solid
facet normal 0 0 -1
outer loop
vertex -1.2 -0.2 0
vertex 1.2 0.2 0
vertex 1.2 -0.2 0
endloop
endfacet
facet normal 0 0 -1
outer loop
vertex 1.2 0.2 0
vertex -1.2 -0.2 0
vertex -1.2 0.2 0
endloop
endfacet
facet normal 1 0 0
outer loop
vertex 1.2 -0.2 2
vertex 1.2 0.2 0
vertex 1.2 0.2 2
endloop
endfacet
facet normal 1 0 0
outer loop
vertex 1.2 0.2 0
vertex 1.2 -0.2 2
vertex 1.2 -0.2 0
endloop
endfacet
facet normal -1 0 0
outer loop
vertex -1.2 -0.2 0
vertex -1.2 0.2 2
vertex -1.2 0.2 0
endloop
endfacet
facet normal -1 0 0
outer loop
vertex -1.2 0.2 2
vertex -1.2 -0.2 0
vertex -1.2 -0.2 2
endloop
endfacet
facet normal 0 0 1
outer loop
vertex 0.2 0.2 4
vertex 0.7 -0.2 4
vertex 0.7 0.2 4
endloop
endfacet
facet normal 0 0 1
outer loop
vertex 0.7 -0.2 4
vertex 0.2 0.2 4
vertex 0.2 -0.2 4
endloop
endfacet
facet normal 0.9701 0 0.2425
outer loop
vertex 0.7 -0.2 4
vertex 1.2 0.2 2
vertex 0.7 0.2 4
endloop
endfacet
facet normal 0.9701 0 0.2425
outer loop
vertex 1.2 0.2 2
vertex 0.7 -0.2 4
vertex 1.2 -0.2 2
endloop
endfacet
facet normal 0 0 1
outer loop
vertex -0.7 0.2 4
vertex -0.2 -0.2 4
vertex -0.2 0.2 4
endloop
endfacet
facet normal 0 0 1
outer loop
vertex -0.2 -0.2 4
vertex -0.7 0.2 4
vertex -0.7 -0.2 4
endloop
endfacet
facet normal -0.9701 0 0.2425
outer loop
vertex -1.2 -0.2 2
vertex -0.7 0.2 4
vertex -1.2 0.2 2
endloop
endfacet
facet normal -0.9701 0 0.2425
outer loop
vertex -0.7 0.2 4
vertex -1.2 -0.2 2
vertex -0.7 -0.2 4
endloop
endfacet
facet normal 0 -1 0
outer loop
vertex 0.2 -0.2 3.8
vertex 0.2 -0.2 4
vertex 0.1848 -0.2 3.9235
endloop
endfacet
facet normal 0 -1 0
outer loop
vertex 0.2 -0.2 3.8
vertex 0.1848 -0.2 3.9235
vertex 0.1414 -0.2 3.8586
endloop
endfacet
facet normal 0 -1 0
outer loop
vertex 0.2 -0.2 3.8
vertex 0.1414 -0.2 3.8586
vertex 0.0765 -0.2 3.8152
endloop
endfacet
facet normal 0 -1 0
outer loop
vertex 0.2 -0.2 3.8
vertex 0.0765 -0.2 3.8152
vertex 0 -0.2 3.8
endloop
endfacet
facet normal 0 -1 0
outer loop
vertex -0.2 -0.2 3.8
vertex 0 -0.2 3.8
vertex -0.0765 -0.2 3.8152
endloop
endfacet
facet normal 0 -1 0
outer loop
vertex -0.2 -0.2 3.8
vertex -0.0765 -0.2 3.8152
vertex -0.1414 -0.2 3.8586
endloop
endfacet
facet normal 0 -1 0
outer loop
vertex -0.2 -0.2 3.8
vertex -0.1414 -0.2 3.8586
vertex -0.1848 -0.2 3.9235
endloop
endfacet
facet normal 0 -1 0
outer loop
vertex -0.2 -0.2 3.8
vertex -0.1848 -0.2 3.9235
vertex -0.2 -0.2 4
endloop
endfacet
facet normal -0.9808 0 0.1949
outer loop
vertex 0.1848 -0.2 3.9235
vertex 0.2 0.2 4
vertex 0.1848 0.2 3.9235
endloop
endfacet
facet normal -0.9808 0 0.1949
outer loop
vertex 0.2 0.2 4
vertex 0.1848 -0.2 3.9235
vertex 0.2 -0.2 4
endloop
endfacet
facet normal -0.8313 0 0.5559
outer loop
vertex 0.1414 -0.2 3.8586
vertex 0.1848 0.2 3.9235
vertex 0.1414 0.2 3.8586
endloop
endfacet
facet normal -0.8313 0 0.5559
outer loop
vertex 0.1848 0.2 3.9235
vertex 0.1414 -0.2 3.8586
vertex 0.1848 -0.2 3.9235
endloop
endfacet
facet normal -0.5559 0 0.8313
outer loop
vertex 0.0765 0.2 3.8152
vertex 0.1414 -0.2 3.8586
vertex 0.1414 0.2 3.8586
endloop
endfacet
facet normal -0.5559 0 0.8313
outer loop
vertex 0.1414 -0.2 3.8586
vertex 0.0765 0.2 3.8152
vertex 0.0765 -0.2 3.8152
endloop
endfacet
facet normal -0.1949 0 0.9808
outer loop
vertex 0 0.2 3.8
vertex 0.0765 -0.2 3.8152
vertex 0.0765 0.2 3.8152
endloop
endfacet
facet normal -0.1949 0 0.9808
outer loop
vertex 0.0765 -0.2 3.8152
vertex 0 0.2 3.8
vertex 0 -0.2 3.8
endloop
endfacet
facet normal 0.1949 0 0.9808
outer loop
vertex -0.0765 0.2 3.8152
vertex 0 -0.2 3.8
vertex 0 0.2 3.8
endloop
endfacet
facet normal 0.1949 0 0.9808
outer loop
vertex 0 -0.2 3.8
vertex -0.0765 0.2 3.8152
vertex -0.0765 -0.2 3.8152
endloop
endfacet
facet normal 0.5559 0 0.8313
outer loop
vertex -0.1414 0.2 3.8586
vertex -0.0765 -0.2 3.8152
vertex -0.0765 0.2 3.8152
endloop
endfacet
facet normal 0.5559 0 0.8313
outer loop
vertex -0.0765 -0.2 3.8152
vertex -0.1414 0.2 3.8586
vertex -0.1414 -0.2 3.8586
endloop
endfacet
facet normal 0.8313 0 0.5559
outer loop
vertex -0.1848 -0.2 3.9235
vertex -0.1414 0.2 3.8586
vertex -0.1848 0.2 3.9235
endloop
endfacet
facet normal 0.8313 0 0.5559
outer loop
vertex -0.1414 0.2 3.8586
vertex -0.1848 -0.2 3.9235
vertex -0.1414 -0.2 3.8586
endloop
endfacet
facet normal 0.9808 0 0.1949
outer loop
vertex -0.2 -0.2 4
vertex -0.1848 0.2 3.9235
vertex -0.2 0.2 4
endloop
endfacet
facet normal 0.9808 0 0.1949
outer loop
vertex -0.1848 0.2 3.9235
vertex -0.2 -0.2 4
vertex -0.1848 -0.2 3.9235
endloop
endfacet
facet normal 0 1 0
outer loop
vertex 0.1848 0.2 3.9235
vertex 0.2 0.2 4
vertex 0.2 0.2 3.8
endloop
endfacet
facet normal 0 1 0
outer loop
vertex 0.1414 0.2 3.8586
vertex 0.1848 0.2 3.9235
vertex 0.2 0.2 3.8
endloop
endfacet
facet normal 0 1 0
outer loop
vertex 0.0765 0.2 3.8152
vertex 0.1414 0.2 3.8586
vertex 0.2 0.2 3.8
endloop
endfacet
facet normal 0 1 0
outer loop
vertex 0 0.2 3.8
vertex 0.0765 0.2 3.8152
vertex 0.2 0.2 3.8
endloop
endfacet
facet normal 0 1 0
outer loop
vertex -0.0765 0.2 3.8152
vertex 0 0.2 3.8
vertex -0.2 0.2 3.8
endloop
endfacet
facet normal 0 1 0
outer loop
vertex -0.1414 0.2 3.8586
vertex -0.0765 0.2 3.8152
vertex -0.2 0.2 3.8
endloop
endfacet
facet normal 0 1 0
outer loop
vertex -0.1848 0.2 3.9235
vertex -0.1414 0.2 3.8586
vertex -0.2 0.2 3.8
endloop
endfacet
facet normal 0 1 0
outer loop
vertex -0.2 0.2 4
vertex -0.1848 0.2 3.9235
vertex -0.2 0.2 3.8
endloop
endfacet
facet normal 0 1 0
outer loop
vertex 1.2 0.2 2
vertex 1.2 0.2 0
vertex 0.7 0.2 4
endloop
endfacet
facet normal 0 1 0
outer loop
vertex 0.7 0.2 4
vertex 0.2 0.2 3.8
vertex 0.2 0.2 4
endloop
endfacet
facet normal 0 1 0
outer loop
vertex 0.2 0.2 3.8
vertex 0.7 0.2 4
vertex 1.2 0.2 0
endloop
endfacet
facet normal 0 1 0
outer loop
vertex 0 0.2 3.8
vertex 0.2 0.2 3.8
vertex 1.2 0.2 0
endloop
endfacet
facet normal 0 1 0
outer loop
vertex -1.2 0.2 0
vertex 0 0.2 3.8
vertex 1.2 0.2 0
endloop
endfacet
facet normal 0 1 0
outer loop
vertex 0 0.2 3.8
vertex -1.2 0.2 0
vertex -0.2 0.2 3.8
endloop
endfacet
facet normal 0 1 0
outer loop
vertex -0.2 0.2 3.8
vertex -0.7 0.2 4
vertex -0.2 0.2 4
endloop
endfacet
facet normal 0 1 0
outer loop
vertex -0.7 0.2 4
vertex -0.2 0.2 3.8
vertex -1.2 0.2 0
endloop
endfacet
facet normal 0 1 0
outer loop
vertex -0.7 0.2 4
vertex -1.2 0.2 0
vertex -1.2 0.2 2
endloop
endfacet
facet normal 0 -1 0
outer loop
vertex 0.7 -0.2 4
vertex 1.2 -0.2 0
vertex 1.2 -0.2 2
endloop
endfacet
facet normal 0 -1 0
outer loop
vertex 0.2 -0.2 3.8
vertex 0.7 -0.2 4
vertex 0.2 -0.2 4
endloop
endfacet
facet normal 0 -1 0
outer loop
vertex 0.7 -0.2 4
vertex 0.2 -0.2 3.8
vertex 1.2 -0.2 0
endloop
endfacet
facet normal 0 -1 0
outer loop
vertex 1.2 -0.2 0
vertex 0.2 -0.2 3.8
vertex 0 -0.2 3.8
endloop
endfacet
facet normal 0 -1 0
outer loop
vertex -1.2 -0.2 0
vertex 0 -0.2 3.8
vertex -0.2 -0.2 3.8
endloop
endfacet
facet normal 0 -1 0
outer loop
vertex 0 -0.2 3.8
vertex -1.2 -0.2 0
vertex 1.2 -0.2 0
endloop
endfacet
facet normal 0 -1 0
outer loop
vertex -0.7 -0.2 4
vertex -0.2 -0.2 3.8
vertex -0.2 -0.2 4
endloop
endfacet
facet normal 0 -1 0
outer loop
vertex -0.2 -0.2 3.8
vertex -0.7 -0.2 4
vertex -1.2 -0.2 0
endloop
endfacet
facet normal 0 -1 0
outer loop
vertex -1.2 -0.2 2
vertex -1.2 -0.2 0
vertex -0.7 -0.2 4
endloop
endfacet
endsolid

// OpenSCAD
// file: ../p/2-4edge.scad
use <../lib.scad>
function ldraw_lib__2_4edge() = [
// 0 Circle 0.5
// 0 Name: 2-4edge.dat
// 0 Author: James Jessiman
// 0 !LDRAW_ORG Primitive UPDATE 2017-01
// 0 !LICENSE Licensed under CC BY 2.0 and CC BY 4.0 : see CAreadme.txt
// 
// 0 BFC CERTIFY CCW
  [0,"BFC","CERTIFY"],
  [0,"BFC","CCW"],
// 
// 0 !HISTORY 2007-06-24 [PTadmin] Header formatted for Contributor Agreement
// 0 !HISTORY 2008-07-01 [PTadmin] Official Update 2008-01
// 0 !HISTORY 2017-01-15 [Steffen] BFCed
// 0 !HISTORY 2017-12-30 [PTadmin] Official Update 2017-01
// 
// 
// 2 24 1 0 0 0.9239 0 0.3827
  [2,24,1,0,0,0.9239,0,0.3827],
// 2 24 0.9239 0 0.3827 0.7071 0 0.7071
  [2,24,0.9239,0,0.3827,0.7071,0,0.7071],
// 2 24 0.7071 0 0.7071 0.3827 0 0.9239
  [2,24,0.7071,0,0.7071,0.3827,0,0.9239],
// 2 24 0.3827 0 0.9239 0 0 1
  [2,24,0.3827,0,0.9239,0,0,1],
// 2 24 0 0 1 -0.3827 0 0.9239
  [2,24,0,0,1,-0.3827,0,0.9239],
// 2 24 -0.3827 0 0.9239 -0.7071 0 0.7071
  [2,24,-0.3827,0,0.9239,-0.7071,0,0.7071],
// 2 24 -0.7071 0 0.7071 -0.9239 0 0.3827
  [2,24,-0.7071,0,0.7071,-0.9239,0,0.3827],
// 2 24 -0.9239 0 0.3827 -1 0 0
  [2,24,-0.9239,0,0.3827,-1,0,0],
];
makepoly(ldraw_lib__2_4edge(), line=0.2);
// file: ../p/2-4cyli.scad
use <../lib.scad>
function ldraw_lib__2_4cyli() = [
// 0 Cylinder 0.5
// 0 Name: 2-4cyli.dat
// 0 Author: James Jessiman
// 0 !LDRAW_ORG Primitive UPDATE 2005-01
// 0 !LICENSE Licensed under CC BY 2.0 and CC BY 4.0 : see CAreadme.txt
// 
// 0 BFC CERTIFY CCW
  [0,"BFC","CERTIFY"],
  [0,"BFC","CCW"],
// 
// 0 !HISTORY 2002-03-23 [sbliss] Added BFC statement; compacted code
// 0 !HISTORY 2002-04-25 [PTadmin] Official Update 2002-02
// 0 !HISTORY 2004-12-11 [nielsk] Recreated using Primitive Generator, Edge lines fixed, BFC changed to CCW
// 0 !HISTORY 2005-12-28 [PTadmin] Official Update 2005-01
// 0 !HISTORY 2007-06-24 [PTadmin] Header formatted for Contributor Agreement
// 0 !HISTORY 2008-07-01 [PTadmin] Official Update 2008-01
// 
// 
// 4 16 .9239 1 .3827 .9239 0 .3827 1 0 0 1 1 0
  [4,16,.9239,1,.3827,.9239,0,.3827,1,0,0,1,1,0],
// 4 16 .7071 1 .7071 .7071 0 .7071 .9239 0 .3827 .9239 1 .3827
  [4,16,.7071,1,.7071,.7071,0,.7071,.9239,0,.3827,.9239,1,.3827],
// 4 16 .3827 1 .9239 .3827 0 .9239 .7071 0 .7071 .7071 1 .7071
  [4,16,.3827,1,.9239,.3827,0,.9239,.7071,0,.7071,.7071,1,.7071],
// 4 16 0 1 1 0 0 1 .3827 0 .9239 .3827 1 .9239
  [4,16,0,1,1,0,0,1,.3827,0,.9239,.3827,1,.9239],
// 4 16 -.3827 1 .9239 -.3827 0 .9239 0 0 1 0 1 1
  [4,16,-.3827,1,.9239,-.3827,0,.9239,0,0,1,0,1,1],
// 4 16 -.7071 1 .7071 -.7071 0 .7071 -.3827 0 .9239 -.3827 1 .9239
  [4,16,-.7071,1,.7071,-.7071,0,.7071,-.3827,0,.9239,-.3827,1,.9239],
// 4 16 -.9239 1 .3827 -.9239 0 .3827 -.7071 0 .7071 -.7071 1 .7071
  [4,16,-.9239,1,.3827,-.9239,0,.3827,-.7071,0,.7071,-.7071,1,.7071],
// 4 16 -1 1 0 -1 0 0 -.9239 0 .3827 -.9239 1 .3827
  [4,16,-1,1,0,-1,0,0,-.9239,0,.3827,-.9239,1,.3827],
// 5 24 1 1 0 1 0 0 1 1 -.4142 .9239 1 .3827
  [5,24,1,1,0,1,0,0,1,1,-.4142,.9239,1,.3827],
// 5 24 .9239 1 .3827 .9239 0 .3827 1 1 0 .7071 1 .7071
  [5,24,.9239,1,.3827,.9239,0,.3827,1,1,0,.7071,1,.7071],
// 5 24 .7071 1 .7071 .7071 0 .7071 .9239 1 .3827 .3827 1 .9239
  [5,24,.7071,1,.7071,.7071,0,.7071,.9239,1,.3827,.3827,1,.9239],
// 5 24 .3827 1 .9239 .3827 0 .9239 .7071 1 .7071 0 1 1
  [5,24,.3827,1,.9239,.3827,0,.9239,.7071,1,.7071,0,1,1],
// 5 24 0 1 1 0 0 1 .3827 1 .9239 -.3827 1 .9239
  [5,24,0,1,1,0,0,1,.3827,1,.9239,-.3827,1,.9239],
// 5 24 -.3827 1 .9239 -.3827 0 .9239 0 1 1 -.7071 1 .7071
  [5,24,-.3827,1,.9239,-.3827,0,.9239,0,1,1,-.7071,1,.7071],
// 5 24 -.7071 1 .7071 -.7071 0 .7071 -.3827 1 .9239 -.9239 1 .3827
  [5,24,-.7071,1,.7071,-.7071,0,.7071,-.3827,1,.9239,-.9239,1,.3827],
// 5 24 -.9239 1 .3827 -.9239 0 .3827 -.7071 1 .7071 -1 1 0
  [5,24,-.9239,1,.3827,-.9239,0,.3827,-.7071,1,.7071,-1,1,0],
// 5 24 -1 1 0 -1 0 0 -.9239 1 .3827 -1 1 -.4142
  [5,24,-1,1,0,-1,0,0,-.9239,1,.3827,-1,1,-.4142],
// 0
];
makepoly(ldraw_lib__2_4cyli(), line=0.2);
// file: ../p/box3u4a.scad
use <../lib.scad>
function ldraw_lib__box3u4a() = [
// 0 Box with 3 Faces without 4 Adjacent Edges
// 0 Name: box3u4a.dat
// 0 Author: Niels Karsdorp [nielsk]
// 0 !LDRAW_ORG Primitive UPDATE 2009-01
// 0 !LICENSE Licensed under CC BY 2.0 and CC BY 4.0 : see CAreadme.txt
// 
// 0 BFC CERTIFY CCW
  [0,"BFC","CERTIFY"],
  [0,"BFC","CCW"],
// 
// 0 !HISTORY 2009-05-02 [PTadmin] Official Update 2009-01
// 
// 
// 2 24 1 1 1 -1 1 1
  [2,24,1,1,1,-1,1,1],
// 2 24 -1 1 -1 1 1 -1
  [2,24,-1,1,-1,1,1,-1],
// 2 24 1 1 1 1 1 -1
  [2,24,1,1,1,1,1,-1],
// 2 24 -1 1 1 -1 1 -1
  [2,24,-1,1,1,-1,1,-1],
// 2 24 1 1 1 1 0 1
  [2,24,1,1,1,1,0,1],
// 2 24 1 1 -1 1 0 -1
  [2,24,1,1,-1,1,0,-1],
// 2 24 -1 1 1 -1 0 1
  [2,24,-1,1,1,-1,0,1],
// 2 24 -1 1 -1 -1 0 -1
  [2,24,-1,1,-1,-1,0,-1],
// 4 16 -1 1 -1 -1 1 1 1 1 1 1 1 -1
  [4,16,-1,1,-1,-1,1,1,1,1,1,1,1,-1],
// 4 16 -1 1 1 -1 0 1 1 0 1 1 1 1
  [4,16,-1,1,1,-1,0,1,1,0,1,1,1,1],
// 4 16 1 1 -1 1 0 -1 -1 0 -1 -1 1 -1
  [4,16,1,1,-1,1,0,-1,-1,0,-1,-1,1,-1],
// 0
];
makepoly(ldraw_lib__box3u4a(), line=0.2);
// file: ../p/box2-5.scad
use <../lib.scad>
function ldraw_lib__box2_5() = [
// 0 Box with 2 Faces without 5 Edges
// 0 Name: box2-5.dat
// 0 Author: Steffen [Steffen]
// 0 !LDRAW_ORG Primitive UPDATE 2003-03
// 0 !LICENSE Licensed under CC BY 2.0 and CC BY 4.0 : see CAreadme.txt
// 
// 0 BFC CERTIFY CCW
  [0,"BFC","CERTIFY"],
  [0,"BFC","CCW"],
// 
// 0 !HISTORY 2003-12-19 [PTadmin] Official Update 2003-03
// 0 !HISTORY 2007-06-24 [PTadmin] Header formatted for Contributor Agreement
// 0 !HISTORY 2008-07-01 [PTadmin] Official Update 2008-01
// 
// 
// 2 24 1 1 1 -1 1 1
  [2,24,1,1,1,-1,1,1],
// 2 24 1 1 -1 -1 1 -1
  [2,24,1,1,-1,-1,1,-1],
// 2 24 1 -1 1 -1 -1 1
  [2,24,1,-1,1,-1,-1,1],
// 2 24 -1 -1 1 -1 1 1
  [2,24,-1,-1,1,-1,1,1],
// 2 24 1 -1 1 1 1 1
  [2,24,1,-1,1,1,1,1],
// 2 24 -1 1 -1 -1 1 1
  [2,24,-1,1,-1,-1,1,1],
// 2 24 1 1 -1 1 1 1
  [2,24,1,1,-1,1,1,1],
// 4 16 1 1 1 1 1 -1 -1 1 -1 -1 1 1
  [4,16,1,1,1,1,1,-1,-1,1,-1,-1,1,1],
// 4 16 1 1 1 -1 1 1 -1 -1 1 1 -1 1
  [4,16,1,1,1,-1,1,1,-1,-1,1,1,-1,1],
// 0
];
makepoly(ldraw_lib__box2_5(), line=0.2);
// file: ../p/2-4ndis.scad
use <../lib.scad>
function ldraw_lib__2_4ndis() = [
// 0 Disc Negative 0.5
// 0 Name: 2-4ndis.dat
// 0 Author: James Jessiman
// 0 !LDRAW_ORG Primitive UPDATE 2012-01
// 0 !LICENSE Licensed under CC BY 2.0 and CC BY 4.0 : see CAreadme.txt
// 
// 0 BFC CERTIFY CCW
  [0,"BFC","CERTIFY"],
  [0,"BFC","CCW"],
// 
// 0 !HISTORY 2002-03-23 [sbliss] Added BFC statement; compacted code
// 0 !HISTORY 2002-04-25 [PTadmin] Official Update 2002-02
// 0 !HISTORY 2007-06-24 [PTadmin] Header formatted for Contributor Agreement
// 0 !HISTORY 2008-07-01 [PTadmin] Official Update 2008-01
// 0 !HISTORY 2012-02-16 [Philo] Changed to CCW
// 0 !HISTORY 2012-03-30 [PTadmin] Official Update 2012-01
// 
// 
// 3 16 0.9239 0 0.3827 1 0 0 1 0 1
  [3,16,0.9239,0,0.3827,1,0,0,1,0,1],
// 3 16 0.7071 0 0.7071 0.9239 0 0.3827 1 0 1
  [3,16,0.7071,0,0.7071,0.9239,0,0.3827,1,0,1],
// 3 16 0.3827 0 0.9239 0.7071 0 0.7071 1 0 1
  [3,16,0.3827,0,0.9239,0.7071,0,0.7071,1,0,1],
// 3 16 0 0 1 0.3827 0 0.9239 1 0 1
  [3,16,0,0,1,0.3827,0,0.9239,1,0,1],
// 3 16 -0.3827 0 0.9239 0 0 1 -1 0 1
  [3,16,-0.3827,0,0.9239,0,0,1,-1,0,1],
// 3 16 -0.7071 0 0.7071 -0.3827 0 0.9239 -1 0 1
  [3,16,-0.7071,0,0.7071,-0.3827,0,0.9239,-1,0,1],
// 3 16 -0.9239 0 0.3827 -0.7071 0 0.7071 -1 0 1
  [3,16,-0.9239,0,0.3827,-0.7071,0,0.7071,-1,0,1],
// 3 16 -1 0 0 -0.9239 0 0.3827 -1 0 1
  [3,16,-1,0,0,-0.9239,0,0.3827,-1,0,1],
];
makepoly(ldraw_lib__2_4ndis(), line=0.2);
// file: ../p/2-4cylo.scad
use <../lib.scad>
use <2-4cyli.scad>
use <2-4edge.scad>
function ldraw_lib__2_4cylo() = [
// 0 Cylinder Open 0.5
// 0 Name: 2-4cylo.dat
// 0 Author: Max Martin Richter [MMR1988]
// 0 !LDRAW_ORG Primitive UPDATE 2010-03
// 0 !LICENSE Licensed under CC BY 2.0 and CC BY 4.0 : see CAreadme.txt
// 
// 0 BFC CERTIFY CCW
  [0,"BFC","CERTIFY"],
  [0,"BFC","CCW"],
// 
// 0 !HISTORY 2010-12-31 [PTadmin] Official Update 2010-03
// 
// 
// 1 16 0 0 0 1 0 0 0 1 0 0 0 1 2-4edge.dat
  [1,16,0,0,0,1,0,0,0,1,0,0,0,1, ldraw_lib__2_4edge()],
// 1 16 0 1 0 1 0 0 0 1 0 0 0 1 2-4edge.dat
  [1,16,0,1,0,1,0,0,0,1,0,0,0,1, ldraw_lib__2_4edge()],
// 1 16 0 0 0 1 0 0 0 1 0 0 0 1 2-4cyli.dat
  [1,16,0,0,0,1,0,0,0,1,0,0,0,1, ldraw_lib__2_4cyli()],
];
makepoly(ldraw_lib__2_4cylo(), line=0.2);
// main file
use <../lib.scad>
use <../p/2-4cylo.scad>
use <../p/2-4ndis.scad>
use <../p/box2-5.scad>
use <../p/box3u4a.scad>
function ldraw_lib__u9269() = [
// 0 ~Electric Brick  2 x  2 x  0.667 Underside Metal Clamp
// 0 Name: u9269.dat
// 0 Author: Max Martin Richter [MMR1988]
// 0 !LDRAW_ORG Part UPDATE 2013-02
// 0 !LICENSE Licensed under CC BY 2.0 and CC BY 4.0 : see CAreadme.txt
// 
// 0 BFC CERTIFY CCW
  [0,"BFC","CERTIFY"],
  [0,"BFC","CCW"],
// 
// 0 !HISTORY 2013-12-23 [PTadmin] Official Update 2013-02
// 
// 
// 1 16 0 -5 0 0 0 3 0 5 0 -0.5 0 0 box3u4a.dat
  [1,16,0,-5,0,0,0,3,0,5,0,-0.5,0,0, ldraw_lib__box3u4a()],
// 1 16 1.75 -7.5 0 0 -0.625 0.625 0 -2.5 0 -0.5 0 0 box2-5.dat
  [1,16,1.75,-7.5,0,0,-0.625,0.625,0,-2.5,0,-0.5,0,0, ldraw_lib__box2_5()],
// 1 16 -1.75 -7.5 0 0 0.625 -0.625 0 -2.5 0 -0.5 0 0 box2-5.dat
  [1,16,-1.75,-7.5,0,0,0.625,-0.625,0,-2.5,0,-0.5,0,0, ldraw_lib__box2_5()],
// 
// 1 16 0 -10 -0.5 0.5 0 0 0 0 0.5 0 1 0 2-4ndis.dat
  [1,16,0,-10,-0.5,0.5,0,0,0,0,0.5,0,1,0, ldraw_lib__2_4ndis()],
// 0 BFC INVERTNEXT
  [0,"BFC","INVERTNEXT"],
// 1 16 0 -10 -0.5 0.5 0 0 0 0 0.5 0 1 0 2-4cylo.dat
  [1,16,0,-10,-0.5,0.5,0,0,0,0,0.5,0,1,0, ldraw_lib__2_4cylo()],
// 1 16 0 -10 0.5 0.5 0 0 0 0 0.5 0 -1 0 2-4ndis.dat
  [1,16,0,-10,0.5,0.5,0,0,0,0,0.5,0,-1,0, ldraw_lib__2_4ndis()],
// 
// 3 16 3 -5 0.5 3 0 0.5 1.75 -10 0.5
  [3,16,3,-5,0.5,3,0,0.5,1.75,-10,0.5],
// 4 16 3 0 0.5 0.5 -9.5 0.5 0.5 -10 0.5 1.75 -10 0.5
  [4,16,3,0,0.5,0.5,-9.5,0.5,0.5,-10,0.5,1.75,-10,0.5],
// 3 16 0 -9.5 0.5 0.5 -9.5 0.5 3 0 0.5
  [3,16,0,-9.5,0.5,0.5,-9.5,0.5,3,0,0.5],
// 4 16 3 0 0.5 -3 0 0.5 -0.5 -9.5 0.5 0 -9.5 0.5
  [4,16,3,0,0.5,-3,0,0.5,-0.5,-9.5,0.5,0,-9.5,0.5],
// 4 16 -1.75 -10 0.5 -0.5 -10 0.5 -0.5 -9.5 0.5 -3 0 0.5
  [4,16,-1.75,-10,0.5,-0.5,-10,0.5,-0.5,-9.5,0.5,-3,0,0.5],
// 3 16 -1.75 -10 0.5 -3 0 0.5 -3 -5 0.5
  [3,16,-1.75,-10,0.5,-3,0,0.5,-3,-5,0.5],
// 
// 3 16 1.75 -10 -0.5 3 0 -0.5 3 -5 -0.5
  [3,16,1.75,-10,-0.5,3,0,-0.5,3,-5,-0.5],
// 4 16 1.75 -10 -0.5 0.5 -10 -0.5 0.5 -9.5 -0.5 3 0 -0.5
  [4,16,1.75,-10,-0.5,0.5,-10,-0.5,0.5,-9.5,-0.5,3,0,-0.5],
// 3 16 3 0 -0.5 0.5 -9.5 -0.5 0 -9.5 -0.5
  [3,16,3,0,-0.5,0.5,-9.5,-0.5,0,-9.5,-0.5],
// 4 16 0 -9.5 -0.5 -0.5 -9.5 -0.5 -3 0 -0.5 3 0 -0.5
  [4,16,0,-9.5,-0.5,-0.5,-9.5,-0.5,-3,0,-0.5,3,0,-0.5],
// 4 16 -3 0 -0.5 -0.5 -9.5 -0.5 -0.5 -10 -0.5 -1.75 -10 -0.5
  [4,16,-3,0,-0.5,-0.5,-9.5,-0.5,-0.5,-10,-0.5,-1.75,-10,-0.5],
// 3 16 -3 -5 -0.5 -3 0 -0.5 -1.75 -10 -0.5
  [3,16,-3,-5,-0.5,-3,0,-0.5,-1.75,-10,-0.5],
];
makepoly(ldraw_lib__u9269(), line=0.2);
